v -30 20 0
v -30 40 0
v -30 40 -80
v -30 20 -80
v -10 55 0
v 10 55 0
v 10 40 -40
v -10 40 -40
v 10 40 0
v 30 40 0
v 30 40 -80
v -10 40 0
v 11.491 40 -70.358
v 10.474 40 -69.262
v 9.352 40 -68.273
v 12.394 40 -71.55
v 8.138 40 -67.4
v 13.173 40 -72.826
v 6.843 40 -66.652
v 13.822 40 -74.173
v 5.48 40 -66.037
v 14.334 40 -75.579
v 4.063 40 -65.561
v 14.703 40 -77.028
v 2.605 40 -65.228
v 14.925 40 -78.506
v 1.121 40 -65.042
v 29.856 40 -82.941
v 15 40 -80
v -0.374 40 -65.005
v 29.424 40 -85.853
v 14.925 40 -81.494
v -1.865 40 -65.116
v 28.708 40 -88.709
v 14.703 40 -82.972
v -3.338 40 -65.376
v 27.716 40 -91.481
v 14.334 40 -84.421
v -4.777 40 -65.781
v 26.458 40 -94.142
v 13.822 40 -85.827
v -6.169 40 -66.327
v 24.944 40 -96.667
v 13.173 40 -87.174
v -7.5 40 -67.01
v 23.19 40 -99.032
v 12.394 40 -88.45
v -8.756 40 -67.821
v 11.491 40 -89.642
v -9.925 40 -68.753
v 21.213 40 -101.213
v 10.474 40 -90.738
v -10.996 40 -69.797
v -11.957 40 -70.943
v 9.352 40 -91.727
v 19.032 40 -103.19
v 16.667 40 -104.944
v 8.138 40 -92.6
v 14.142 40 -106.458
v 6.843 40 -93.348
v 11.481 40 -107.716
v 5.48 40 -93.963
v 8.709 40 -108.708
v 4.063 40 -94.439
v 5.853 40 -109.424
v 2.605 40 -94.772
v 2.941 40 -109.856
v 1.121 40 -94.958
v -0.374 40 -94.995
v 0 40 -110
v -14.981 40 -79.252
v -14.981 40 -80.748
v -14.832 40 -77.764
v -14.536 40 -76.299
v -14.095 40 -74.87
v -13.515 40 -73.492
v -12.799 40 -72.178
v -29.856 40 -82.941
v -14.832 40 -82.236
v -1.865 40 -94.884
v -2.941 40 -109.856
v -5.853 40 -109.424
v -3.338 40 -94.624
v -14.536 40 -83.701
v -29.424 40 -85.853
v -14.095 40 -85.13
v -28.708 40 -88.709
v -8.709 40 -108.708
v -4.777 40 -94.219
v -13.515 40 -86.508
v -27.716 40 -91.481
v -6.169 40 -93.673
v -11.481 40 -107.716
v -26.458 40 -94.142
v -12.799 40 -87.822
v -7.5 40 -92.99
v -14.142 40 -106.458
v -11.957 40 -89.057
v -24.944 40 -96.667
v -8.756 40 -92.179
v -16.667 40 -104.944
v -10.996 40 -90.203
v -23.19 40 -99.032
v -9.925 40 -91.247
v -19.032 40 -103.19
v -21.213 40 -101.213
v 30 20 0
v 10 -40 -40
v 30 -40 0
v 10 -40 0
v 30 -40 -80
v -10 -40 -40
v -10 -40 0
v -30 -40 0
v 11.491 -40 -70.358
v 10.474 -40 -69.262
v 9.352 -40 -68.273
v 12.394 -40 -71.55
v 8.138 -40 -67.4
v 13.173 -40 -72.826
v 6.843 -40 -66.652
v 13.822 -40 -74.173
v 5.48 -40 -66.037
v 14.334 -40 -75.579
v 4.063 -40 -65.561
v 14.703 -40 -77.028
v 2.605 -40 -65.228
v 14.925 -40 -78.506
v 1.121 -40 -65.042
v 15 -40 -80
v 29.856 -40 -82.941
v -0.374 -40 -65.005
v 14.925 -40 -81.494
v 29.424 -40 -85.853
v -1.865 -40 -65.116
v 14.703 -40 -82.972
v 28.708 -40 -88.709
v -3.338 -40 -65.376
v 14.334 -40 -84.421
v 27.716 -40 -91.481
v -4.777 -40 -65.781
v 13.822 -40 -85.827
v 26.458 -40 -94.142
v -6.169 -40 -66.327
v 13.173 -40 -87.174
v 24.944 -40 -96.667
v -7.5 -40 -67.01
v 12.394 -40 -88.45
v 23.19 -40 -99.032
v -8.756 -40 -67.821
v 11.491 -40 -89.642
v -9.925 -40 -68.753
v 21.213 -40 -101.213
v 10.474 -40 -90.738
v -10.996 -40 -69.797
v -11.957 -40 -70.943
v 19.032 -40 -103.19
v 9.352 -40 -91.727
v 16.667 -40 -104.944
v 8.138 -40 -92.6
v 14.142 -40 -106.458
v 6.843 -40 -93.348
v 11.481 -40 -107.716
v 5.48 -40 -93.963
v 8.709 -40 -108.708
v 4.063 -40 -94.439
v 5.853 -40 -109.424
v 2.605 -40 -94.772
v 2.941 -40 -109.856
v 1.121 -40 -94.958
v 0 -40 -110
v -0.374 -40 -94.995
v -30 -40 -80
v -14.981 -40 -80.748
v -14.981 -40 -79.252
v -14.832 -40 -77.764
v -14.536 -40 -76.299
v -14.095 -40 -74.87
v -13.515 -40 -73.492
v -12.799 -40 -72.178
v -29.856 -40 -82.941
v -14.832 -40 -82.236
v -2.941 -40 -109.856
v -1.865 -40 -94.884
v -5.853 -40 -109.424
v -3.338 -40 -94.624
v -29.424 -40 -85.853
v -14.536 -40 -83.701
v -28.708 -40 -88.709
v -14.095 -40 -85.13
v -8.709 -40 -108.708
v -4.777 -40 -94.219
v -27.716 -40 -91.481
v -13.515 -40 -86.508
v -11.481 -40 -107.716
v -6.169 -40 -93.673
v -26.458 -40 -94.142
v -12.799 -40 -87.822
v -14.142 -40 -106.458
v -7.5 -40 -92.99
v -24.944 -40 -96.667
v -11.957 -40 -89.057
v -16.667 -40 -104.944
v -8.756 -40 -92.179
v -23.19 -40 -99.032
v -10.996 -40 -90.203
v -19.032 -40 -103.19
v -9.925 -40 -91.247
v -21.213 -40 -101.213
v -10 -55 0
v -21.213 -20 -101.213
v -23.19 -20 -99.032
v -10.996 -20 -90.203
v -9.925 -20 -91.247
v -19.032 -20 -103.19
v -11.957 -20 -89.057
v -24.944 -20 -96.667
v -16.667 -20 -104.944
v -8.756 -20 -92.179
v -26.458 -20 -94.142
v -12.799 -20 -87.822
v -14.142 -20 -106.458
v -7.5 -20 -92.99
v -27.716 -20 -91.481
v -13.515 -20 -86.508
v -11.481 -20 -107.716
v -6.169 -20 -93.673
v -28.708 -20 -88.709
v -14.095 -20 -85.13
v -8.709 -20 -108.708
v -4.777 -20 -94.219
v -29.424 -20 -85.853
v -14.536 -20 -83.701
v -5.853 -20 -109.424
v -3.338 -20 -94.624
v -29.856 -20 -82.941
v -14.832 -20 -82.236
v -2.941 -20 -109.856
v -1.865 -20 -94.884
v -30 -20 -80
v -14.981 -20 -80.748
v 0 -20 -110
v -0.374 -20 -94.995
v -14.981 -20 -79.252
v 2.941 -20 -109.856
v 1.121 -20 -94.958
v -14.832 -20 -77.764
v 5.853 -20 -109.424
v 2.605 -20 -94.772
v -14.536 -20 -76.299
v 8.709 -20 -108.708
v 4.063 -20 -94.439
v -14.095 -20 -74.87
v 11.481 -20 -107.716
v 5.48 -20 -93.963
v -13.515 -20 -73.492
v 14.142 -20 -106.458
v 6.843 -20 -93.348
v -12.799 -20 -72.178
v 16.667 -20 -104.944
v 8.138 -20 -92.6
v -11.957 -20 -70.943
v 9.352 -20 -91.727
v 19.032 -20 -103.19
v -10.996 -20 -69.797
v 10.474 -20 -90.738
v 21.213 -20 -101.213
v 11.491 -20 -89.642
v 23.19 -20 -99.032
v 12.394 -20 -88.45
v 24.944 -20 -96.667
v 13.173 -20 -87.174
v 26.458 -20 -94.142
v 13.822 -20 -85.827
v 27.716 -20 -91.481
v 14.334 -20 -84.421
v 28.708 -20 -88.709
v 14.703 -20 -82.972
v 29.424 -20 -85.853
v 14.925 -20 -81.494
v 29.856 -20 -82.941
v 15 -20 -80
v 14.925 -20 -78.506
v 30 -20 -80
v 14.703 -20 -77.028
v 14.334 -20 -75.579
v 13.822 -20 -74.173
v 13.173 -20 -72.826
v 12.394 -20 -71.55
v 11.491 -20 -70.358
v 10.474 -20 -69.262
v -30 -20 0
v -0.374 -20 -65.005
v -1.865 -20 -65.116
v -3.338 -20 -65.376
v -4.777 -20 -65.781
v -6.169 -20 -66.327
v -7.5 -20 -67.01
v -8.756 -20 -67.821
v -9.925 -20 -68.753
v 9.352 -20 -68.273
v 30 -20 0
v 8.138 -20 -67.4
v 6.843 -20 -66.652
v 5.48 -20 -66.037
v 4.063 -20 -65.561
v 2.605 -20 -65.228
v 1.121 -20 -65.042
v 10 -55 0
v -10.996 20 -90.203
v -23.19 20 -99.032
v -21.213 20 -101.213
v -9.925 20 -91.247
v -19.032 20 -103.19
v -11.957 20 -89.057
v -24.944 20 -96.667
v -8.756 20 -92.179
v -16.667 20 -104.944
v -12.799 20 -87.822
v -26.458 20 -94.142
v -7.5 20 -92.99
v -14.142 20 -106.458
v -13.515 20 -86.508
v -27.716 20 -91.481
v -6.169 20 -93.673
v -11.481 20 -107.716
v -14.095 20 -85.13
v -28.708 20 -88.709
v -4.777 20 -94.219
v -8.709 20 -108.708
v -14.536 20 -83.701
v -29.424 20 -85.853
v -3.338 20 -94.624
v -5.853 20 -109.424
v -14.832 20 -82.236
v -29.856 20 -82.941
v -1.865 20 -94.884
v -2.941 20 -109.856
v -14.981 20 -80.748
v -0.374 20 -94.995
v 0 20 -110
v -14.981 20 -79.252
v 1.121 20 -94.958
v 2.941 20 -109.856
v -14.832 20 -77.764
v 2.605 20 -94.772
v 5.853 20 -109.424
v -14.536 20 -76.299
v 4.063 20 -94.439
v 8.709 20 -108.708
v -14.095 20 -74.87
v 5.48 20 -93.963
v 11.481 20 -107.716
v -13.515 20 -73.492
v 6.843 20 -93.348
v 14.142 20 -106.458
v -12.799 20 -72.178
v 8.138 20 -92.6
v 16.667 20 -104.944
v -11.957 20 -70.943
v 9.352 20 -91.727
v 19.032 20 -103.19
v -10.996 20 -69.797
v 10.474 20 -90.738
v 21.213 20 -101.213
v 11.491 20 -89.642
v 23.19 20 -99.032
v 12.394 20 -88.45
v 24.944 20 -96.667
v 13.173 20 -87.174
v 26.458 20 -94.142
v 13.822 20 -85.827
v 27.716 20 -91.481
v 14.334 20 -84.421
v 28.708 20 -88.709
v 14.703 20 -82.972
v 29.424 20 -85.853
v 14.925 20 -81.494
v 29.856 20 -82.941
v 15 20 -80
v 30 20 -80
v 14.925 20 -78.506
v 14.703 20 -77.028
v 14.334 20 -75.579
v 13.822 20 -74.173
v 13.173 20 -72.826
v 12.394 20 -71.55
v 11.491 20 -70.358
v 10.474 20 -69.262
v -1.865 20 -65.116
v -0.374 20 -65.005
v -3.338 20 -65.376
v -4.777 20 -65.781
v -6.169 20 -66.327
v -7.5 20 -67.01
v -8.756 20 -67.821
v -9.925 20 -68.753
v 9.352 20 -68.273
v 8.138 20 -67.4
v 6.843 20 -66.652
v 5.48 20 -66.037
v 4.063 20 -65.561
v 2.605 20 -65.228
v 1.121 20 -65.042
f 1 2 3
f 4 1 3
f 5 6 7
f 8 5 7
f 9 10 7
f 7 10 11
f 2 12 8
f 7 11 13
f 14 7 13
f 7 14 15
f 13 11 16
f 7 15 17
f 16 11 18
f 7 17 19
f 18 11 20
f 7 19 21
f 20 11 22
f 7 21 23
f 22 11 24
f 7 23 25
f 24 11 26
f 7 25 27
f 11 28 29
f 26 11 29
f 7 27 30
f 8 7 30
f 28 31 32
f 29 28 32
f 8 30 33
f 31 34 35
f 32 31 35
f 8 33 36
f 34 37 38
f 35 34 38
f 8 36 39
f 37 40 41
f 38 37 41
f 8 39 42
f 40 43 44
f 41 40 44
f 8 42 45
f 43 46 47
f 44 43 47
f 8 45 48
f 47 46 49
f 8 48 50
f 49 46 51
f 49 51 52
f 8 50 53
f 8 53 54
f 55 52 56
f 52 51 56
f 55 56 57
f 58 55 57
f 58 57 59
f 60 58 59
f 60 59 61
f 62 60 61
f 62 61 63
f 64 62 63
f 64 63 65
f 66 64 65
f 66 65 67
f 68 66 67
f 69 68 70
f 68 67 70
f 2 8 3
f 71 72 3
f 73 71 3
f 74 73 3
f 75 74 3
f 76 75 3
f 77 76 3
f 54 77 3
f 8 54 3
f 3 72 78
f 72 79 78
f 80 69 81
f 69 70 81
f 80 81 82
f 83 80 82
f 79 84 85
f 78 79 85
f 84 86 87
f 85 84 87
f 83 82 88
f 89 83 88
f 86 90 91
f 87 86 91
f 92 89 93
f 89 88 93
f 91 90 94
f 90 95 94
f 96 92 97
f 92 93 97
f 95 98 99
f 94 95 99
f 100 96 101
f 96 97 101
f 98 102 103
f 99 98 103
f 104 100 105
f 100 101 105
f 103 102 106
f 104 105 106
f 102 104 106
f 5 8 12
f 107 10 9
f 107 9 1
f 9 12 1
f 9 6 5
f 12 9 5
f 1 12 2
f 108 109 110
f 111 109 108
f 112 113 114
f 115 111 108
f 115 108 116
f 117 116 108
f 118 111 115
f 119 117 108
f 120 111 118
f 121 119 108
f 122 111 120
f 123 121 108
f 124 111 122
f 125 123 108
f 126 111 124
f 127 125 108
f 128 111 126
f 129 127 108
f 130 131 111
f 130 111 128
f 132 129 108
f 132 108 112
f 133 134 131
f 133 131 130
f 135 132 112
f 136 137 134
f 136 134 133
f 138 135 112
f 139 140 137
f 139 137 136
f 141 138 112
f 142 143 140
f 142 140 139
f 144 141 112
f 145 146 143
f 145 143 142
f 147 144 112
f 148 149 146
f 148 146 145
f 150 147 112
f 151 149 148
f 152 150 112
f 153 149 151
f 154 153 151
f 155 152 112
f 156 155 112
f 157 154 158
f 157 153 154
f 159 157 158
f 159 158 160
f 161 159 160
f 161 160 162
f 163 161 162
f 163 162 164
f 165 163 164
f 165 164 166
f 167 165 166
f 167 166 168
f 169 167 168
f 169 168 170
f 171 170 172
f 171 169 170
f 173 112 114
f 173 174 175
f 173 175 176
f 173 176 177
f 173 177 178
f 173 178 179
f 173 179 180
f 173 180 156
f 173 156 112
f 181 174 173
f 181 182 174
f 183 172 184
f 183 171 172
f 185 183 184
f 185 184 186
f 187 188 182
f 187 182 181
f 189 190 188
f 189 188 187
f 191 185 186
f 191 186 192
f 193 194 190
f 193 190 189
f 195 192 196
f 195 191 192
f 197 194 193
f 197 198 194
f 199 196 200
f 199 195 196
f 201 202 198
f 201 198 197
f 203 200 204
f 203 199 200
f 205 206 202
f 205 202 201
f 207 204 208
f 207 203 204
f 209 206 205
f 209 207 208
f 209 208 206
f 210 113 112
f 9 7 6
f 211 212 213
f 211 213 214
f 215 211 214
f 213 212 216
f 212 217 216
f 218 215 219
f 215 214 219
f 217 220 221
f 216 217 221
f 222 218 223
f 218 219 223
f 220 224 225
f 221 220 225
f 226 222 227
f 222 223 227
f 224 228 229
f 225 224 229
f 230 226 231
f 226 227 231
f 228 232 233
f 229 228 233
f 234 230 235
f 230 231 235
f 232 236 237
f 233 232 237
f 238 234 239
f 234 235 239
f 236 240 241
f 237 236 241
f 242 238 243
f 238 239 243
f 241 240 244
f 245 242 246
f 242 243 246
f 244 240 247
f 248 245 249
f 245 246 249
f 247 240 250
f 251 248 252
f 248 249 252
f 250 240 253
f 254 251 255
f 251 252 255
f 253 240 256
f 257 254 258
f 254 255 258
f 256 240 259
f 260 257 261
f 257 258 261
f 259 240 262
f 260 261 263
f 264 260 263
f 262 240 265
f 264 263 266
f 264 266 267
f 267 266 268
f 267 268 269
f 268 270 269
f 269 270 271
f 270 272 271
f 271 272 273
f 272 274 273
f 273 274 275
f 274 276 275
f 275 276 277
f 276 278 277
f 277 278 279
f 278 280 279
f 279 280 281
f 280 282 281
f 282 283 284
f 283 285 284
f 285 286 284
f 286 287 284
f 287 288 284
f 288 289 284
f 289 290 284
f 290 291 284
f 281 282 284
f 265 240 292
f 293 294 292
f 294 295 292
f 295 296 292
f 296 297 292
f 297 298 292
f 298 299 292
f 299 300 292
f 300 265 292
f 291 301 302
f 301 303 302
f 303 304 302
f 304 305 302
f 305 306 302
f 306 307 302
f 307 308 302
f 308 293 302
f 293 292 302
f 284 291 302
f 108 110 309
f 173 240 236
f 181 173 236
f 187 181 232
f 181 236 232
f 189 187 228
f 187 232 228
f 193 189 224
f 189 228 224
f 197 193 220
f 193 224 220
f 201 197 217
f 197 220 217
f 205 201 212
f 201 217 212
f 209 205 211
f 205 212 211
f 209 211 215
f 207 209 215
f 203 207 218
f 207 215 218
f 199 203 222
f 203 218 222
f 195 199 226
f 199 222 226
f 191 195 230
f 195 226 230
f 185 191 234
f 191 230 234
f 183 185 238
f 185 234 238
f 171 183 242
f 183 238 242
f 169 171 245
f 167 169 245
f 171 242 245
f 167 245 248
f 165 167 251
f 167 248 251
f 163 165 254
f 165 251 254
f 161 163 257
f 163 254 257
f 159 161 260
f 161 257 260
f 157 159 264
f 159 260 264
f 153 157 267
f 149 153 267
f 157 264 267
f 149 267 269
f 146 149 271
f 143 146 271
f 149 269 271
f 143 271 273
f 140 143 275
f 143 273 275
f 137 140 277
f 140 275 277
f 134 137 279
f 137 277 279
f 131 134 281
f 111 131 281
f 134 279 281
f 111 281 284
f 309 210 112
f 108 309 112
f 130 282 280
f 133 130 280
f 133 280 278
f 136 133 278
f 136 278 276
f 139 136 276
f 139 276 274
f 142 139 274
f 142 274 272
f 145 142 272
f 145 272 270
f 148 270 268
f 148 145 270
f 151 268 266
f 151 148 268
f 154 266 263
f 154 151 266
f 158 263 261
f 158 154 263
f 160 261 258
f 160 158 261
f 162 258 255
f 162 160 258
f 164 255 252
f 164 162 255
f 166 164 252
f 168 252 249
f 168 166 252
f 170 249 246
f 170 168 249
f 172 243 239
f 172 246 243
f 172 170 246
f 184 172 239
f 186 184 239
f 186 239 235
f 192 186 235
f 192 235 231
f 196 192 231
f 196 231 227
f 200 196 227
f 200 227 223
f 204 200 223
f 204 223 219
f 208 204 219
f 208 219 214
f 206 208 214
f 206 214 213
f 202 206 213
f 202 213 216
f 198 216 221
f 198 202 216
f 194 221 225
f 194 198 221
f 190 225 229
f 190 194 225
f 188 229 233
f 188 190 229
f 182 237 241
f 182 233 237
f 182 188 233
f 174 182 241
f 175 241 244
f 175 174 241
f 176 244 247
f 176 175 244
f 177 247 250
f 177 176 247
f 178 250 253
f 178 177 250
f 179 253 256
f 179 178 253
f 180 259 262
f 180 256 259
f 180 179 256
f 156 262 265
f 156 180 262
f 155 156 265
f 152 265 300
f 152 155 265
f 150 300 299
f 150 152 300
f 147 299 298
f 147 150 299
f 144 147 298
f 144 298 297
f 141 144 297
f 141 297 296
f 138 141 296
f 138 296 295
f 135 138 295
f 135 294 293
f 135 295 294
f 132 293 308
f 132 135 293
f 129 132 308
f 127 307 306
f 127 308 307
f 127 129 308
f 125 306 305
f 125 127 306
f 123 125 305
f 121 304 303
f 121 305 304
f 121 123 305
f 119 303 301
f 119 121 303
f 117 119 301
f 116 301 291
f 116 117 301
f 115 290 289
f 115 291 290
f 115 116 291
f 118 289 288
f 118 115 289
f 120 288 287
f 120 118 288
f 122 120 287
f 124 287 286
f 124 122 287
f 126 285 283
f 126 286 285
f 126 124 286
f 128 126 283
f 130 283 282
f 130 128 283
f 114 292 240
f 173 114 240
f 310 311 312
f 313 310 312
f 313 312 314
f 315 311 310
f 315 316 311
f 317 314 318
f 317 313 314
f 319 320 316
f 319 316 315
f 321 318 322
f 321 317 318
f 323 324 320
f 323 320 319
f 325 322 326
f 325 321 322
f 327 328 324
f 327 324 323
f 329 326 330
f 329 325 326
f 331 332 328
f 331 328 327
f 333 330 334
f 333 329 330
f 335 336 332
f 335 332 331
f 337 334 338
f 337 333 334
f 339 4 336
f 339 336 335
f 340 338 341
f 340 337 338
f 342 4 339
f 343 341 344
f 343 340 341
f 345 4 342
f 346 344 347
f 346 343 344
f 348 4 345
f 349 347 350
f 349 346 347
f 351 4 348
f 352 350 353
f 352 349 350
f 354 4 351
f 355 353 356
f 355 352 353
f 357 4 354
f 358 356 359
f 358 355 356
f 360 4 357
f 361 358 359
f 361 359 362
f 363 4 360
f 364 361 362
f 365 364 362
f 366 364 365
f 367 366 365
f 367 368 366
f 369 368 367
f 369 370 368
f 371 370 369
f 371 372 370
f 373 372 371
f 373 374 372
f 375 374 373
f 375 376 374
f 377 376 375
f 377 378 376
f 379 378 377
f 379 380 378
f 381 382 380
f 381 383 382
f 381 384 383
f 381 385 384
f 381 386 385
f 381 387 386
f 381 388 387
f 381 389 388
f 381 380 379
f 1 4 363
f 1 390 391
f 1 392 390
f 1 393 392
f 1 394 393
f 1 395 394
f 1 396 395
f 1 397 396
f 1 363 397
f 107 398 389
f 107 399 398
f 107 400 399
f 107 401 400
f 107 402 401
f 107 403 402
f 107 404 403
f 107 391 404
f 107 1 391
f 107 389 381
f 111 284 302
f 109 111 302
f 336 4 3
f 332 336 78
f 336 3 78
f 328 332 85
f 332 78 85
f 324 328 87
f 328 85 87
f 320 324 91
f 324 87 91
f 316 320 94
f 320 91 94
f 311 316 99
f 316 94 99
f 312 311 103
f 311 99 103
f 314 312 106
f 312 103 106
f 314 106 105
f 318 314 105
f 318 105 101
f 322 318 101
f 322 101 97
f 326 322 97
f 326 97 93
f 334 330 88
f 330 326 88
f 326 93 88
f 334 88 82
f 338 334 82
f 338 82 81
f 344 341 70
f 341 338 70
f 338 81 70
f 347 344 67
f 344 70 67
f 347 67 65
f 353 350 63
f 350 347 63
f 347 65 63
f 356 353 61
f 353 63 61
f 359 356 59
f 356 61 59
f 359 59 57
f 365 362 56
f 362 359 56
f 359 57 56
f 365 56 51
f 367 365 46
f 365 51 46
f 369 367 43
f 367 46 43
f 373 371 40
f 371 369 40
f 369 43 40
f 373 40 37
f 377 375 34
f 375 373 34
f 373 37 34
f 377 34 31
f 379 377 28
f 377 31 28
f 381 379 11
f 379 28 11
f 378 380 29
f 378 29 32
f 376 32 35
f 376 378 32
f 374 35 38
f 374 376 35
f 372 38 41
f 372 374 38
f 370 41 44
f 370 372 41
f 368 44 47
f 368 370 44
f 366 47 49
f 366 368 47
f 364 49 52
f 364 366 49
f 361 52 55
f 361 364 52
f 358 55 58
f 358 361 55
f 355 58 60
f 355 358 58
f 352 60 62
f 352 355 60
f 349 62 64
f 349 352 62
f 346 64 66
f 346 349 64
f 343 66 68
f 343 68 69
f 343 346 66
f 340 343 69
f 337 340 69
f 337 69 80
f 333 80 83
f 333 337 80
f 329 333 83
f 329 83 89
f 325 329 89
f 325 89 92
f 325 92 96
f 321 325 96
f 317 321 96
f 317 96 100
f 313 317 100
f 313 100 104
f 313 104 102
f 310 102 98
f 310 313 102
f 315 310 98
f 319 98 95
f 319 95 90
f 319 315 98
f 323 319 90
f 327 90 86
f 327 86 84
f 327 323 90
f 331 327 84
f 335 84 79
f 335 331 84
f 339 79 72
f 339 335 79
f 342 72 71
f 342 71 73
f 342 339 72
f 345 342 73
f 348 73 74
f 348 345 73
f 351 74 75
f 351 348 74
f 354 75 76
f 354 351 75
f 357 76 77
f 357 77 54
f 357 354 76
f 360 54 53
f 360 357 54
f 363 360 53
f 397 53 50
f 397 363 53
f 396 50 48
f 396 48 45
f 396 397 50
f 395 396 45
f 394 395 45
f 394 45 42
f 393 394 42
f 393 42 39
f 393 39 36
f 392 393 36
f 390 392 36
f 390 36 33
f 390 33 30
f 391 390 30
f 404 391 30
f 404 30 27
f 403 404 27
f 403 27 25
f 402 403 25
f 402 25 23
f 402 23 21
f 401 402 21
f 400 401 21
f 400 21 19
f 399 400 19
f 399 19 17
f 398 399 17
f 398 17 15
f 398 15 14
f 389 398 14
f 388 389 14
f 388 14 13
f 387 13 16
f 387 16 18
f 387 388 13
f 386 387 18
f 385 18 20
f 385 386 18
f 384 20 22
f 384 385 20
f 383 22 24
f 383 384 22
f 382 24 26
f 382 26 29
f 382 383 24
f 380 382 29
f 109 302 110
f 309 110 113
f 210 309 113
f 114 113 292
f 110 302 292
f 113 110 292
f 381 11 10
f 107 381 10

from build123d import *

# Parameters (mm, degrees)
SKETCH_1_R          = 15
EXTRUDE_2_DEPTH     = 40
SKETCH_2_W          = 60
SKETCH_2_H          = 40
CUT_EXTRUDE_1_DEPTH = 110
EXTRUDE_3_DEPTH     = 10


with BuildPart() as part:
    # 草图1 → 凸台-拉伸2 (new body, symmetric)
    with BuildSketch(Plane(origin=(0, 0, 0), x_dir=(1, 0, 0), z_dir=(0, 1, 0))):
        with BuildLine():
            Line((-30, 0), (-30, 80))
            ThreePointArc((-30, 80), (0, 110), (30, 80))
            Line((30, 80), (30, 0))
            Line((30, 0), (-30, 0))
        make_face()
        with Locations((0, 80)):
            Circle(SKETCH_1_R, mode=Mode.SUBTRACT)
    extrude(amount=EXTRUDE_2_DEPTH, both=True)

    # 草图2 → 切除-拉伸1 (cut)
    with BuildSketch(Plane.XY):
        Rectangle(SKETCH_2_W, SKETCH_2_H)
    extrude(amount=-CUT_EXTRUDE_1_DEPTH, mode=Mode.SUBTRACT)

    # 草图3 → 凸台-拉伸3 (add, symmetric)
    with BuildSketch(Plane(origin=(0, 0, 0), x_dir=(0, 0, -1), z_dir=(1, 0, 0))):
        Polygon((0, -55), (40, -40), (0, -40), align=None)
        Polygon((0, 55), (40, 40), (0, 40), align=None)
    extrude(amount=EXTRUDE_3_DEPTH, both=True)


solid = part.part
